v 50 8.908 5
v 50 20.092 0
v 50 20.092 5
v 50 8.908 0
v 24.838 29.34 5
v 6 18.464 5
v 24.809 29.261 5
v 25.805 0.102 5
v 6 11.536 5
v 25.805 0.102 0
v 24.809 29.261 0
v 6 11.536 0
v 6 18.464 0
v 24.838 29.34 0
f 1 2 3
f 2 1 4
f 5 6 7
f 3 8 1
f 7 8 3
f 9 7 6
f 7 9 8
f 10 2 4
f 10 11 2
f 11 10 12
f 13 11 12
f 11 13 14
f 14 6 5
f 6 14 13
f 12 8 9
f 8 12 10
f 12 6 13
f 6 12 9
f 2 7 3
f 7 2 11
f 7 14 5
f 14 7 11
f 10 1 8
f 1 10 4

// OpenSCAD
difference() {
    cube([50,30,5]);
    translate([0,15,-0.1])
    cut(30);
    mirror([0,1,0])
    translate([0,-15,-0.1])
    cut(30);
    translate([-4,0,-0.1])
    cube([10,30,6]);
    translate([53,19,-0.1])
    cut(70);
    translate([53,10,-0.1])
    mirror([0,1,0])
    cut(70);
}


module cut(deg=0) {
    rotate([0,0,deg])
    cube([30,30,6]);
}
